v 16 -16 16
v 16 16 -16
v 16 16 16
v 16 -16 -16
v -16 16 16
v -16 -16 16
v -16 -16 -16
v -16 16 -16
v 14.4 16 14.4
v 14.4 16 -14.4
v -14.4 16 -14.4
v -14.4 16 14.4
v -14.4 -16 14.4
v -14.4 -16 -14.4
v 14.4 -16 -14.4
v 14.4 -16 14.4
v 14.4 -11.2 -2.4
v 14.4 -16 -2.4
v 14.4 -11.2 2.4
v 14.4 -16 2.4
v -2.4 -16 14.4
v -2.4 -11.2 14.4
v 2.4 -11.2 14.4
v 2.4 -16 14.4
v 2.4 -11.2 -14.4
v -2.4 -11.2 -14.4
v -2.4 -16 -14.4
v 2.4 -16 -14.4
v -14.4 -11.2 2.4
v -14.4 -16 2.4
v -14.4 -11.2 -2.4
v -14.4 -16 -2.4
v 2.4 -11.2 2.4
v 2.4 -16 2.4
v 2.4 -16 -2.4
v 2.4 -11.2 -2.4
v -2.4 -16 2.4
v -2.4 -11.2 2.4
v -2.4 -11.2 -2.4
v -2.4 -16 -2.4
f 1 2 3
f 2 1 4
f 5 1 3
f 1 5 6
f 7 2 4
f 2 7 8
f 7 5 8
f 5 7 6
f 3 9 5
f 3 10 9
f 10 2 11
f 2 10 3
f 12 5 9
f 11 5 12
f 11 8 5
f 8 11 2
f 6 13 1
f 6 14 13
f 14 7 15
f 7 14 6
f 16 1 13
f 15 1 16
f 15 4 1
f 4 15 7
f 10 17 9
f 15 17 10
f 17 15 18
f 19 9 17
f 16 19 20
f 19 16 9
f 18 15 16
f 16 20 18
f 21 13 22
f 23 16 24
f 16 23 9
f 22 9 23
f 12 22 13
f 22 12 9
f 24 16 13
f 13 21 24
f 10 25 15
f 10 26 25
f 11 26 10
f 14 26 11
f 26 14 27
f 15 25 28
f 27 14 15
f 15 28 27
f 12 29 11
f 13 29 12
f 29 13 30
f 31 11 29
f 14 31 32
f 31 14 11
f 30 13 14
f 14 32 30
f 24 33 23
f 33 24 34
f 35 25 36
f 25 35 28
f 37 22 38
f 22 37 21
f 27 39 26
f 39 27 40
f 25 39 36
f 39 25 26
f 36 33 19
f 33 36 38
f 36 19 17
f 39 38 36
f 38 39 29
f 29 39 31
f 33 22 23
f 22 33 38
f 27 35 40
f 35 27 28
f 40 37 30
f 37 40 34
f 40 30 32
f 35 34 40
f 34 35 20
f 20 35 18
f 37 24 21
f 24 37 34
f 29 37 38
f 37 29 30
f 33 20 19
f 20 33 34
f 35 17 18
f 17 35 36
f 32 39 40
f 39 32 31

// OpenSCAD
size=32; //block=32 //item=8
difference(){	//casing
cube([size*1,size*1,size*1],center=true);
cube([size*0.9,size*1.1,size*0.9],center=true);
};

translate([0,-size*0.425,0]){
cube([size*0.15,size*0.15,size*1],center=true);	//gridVertical
cube([size*1,size*0.15,size*0.15],center=true);	//gridHorizontal
};	//translate
